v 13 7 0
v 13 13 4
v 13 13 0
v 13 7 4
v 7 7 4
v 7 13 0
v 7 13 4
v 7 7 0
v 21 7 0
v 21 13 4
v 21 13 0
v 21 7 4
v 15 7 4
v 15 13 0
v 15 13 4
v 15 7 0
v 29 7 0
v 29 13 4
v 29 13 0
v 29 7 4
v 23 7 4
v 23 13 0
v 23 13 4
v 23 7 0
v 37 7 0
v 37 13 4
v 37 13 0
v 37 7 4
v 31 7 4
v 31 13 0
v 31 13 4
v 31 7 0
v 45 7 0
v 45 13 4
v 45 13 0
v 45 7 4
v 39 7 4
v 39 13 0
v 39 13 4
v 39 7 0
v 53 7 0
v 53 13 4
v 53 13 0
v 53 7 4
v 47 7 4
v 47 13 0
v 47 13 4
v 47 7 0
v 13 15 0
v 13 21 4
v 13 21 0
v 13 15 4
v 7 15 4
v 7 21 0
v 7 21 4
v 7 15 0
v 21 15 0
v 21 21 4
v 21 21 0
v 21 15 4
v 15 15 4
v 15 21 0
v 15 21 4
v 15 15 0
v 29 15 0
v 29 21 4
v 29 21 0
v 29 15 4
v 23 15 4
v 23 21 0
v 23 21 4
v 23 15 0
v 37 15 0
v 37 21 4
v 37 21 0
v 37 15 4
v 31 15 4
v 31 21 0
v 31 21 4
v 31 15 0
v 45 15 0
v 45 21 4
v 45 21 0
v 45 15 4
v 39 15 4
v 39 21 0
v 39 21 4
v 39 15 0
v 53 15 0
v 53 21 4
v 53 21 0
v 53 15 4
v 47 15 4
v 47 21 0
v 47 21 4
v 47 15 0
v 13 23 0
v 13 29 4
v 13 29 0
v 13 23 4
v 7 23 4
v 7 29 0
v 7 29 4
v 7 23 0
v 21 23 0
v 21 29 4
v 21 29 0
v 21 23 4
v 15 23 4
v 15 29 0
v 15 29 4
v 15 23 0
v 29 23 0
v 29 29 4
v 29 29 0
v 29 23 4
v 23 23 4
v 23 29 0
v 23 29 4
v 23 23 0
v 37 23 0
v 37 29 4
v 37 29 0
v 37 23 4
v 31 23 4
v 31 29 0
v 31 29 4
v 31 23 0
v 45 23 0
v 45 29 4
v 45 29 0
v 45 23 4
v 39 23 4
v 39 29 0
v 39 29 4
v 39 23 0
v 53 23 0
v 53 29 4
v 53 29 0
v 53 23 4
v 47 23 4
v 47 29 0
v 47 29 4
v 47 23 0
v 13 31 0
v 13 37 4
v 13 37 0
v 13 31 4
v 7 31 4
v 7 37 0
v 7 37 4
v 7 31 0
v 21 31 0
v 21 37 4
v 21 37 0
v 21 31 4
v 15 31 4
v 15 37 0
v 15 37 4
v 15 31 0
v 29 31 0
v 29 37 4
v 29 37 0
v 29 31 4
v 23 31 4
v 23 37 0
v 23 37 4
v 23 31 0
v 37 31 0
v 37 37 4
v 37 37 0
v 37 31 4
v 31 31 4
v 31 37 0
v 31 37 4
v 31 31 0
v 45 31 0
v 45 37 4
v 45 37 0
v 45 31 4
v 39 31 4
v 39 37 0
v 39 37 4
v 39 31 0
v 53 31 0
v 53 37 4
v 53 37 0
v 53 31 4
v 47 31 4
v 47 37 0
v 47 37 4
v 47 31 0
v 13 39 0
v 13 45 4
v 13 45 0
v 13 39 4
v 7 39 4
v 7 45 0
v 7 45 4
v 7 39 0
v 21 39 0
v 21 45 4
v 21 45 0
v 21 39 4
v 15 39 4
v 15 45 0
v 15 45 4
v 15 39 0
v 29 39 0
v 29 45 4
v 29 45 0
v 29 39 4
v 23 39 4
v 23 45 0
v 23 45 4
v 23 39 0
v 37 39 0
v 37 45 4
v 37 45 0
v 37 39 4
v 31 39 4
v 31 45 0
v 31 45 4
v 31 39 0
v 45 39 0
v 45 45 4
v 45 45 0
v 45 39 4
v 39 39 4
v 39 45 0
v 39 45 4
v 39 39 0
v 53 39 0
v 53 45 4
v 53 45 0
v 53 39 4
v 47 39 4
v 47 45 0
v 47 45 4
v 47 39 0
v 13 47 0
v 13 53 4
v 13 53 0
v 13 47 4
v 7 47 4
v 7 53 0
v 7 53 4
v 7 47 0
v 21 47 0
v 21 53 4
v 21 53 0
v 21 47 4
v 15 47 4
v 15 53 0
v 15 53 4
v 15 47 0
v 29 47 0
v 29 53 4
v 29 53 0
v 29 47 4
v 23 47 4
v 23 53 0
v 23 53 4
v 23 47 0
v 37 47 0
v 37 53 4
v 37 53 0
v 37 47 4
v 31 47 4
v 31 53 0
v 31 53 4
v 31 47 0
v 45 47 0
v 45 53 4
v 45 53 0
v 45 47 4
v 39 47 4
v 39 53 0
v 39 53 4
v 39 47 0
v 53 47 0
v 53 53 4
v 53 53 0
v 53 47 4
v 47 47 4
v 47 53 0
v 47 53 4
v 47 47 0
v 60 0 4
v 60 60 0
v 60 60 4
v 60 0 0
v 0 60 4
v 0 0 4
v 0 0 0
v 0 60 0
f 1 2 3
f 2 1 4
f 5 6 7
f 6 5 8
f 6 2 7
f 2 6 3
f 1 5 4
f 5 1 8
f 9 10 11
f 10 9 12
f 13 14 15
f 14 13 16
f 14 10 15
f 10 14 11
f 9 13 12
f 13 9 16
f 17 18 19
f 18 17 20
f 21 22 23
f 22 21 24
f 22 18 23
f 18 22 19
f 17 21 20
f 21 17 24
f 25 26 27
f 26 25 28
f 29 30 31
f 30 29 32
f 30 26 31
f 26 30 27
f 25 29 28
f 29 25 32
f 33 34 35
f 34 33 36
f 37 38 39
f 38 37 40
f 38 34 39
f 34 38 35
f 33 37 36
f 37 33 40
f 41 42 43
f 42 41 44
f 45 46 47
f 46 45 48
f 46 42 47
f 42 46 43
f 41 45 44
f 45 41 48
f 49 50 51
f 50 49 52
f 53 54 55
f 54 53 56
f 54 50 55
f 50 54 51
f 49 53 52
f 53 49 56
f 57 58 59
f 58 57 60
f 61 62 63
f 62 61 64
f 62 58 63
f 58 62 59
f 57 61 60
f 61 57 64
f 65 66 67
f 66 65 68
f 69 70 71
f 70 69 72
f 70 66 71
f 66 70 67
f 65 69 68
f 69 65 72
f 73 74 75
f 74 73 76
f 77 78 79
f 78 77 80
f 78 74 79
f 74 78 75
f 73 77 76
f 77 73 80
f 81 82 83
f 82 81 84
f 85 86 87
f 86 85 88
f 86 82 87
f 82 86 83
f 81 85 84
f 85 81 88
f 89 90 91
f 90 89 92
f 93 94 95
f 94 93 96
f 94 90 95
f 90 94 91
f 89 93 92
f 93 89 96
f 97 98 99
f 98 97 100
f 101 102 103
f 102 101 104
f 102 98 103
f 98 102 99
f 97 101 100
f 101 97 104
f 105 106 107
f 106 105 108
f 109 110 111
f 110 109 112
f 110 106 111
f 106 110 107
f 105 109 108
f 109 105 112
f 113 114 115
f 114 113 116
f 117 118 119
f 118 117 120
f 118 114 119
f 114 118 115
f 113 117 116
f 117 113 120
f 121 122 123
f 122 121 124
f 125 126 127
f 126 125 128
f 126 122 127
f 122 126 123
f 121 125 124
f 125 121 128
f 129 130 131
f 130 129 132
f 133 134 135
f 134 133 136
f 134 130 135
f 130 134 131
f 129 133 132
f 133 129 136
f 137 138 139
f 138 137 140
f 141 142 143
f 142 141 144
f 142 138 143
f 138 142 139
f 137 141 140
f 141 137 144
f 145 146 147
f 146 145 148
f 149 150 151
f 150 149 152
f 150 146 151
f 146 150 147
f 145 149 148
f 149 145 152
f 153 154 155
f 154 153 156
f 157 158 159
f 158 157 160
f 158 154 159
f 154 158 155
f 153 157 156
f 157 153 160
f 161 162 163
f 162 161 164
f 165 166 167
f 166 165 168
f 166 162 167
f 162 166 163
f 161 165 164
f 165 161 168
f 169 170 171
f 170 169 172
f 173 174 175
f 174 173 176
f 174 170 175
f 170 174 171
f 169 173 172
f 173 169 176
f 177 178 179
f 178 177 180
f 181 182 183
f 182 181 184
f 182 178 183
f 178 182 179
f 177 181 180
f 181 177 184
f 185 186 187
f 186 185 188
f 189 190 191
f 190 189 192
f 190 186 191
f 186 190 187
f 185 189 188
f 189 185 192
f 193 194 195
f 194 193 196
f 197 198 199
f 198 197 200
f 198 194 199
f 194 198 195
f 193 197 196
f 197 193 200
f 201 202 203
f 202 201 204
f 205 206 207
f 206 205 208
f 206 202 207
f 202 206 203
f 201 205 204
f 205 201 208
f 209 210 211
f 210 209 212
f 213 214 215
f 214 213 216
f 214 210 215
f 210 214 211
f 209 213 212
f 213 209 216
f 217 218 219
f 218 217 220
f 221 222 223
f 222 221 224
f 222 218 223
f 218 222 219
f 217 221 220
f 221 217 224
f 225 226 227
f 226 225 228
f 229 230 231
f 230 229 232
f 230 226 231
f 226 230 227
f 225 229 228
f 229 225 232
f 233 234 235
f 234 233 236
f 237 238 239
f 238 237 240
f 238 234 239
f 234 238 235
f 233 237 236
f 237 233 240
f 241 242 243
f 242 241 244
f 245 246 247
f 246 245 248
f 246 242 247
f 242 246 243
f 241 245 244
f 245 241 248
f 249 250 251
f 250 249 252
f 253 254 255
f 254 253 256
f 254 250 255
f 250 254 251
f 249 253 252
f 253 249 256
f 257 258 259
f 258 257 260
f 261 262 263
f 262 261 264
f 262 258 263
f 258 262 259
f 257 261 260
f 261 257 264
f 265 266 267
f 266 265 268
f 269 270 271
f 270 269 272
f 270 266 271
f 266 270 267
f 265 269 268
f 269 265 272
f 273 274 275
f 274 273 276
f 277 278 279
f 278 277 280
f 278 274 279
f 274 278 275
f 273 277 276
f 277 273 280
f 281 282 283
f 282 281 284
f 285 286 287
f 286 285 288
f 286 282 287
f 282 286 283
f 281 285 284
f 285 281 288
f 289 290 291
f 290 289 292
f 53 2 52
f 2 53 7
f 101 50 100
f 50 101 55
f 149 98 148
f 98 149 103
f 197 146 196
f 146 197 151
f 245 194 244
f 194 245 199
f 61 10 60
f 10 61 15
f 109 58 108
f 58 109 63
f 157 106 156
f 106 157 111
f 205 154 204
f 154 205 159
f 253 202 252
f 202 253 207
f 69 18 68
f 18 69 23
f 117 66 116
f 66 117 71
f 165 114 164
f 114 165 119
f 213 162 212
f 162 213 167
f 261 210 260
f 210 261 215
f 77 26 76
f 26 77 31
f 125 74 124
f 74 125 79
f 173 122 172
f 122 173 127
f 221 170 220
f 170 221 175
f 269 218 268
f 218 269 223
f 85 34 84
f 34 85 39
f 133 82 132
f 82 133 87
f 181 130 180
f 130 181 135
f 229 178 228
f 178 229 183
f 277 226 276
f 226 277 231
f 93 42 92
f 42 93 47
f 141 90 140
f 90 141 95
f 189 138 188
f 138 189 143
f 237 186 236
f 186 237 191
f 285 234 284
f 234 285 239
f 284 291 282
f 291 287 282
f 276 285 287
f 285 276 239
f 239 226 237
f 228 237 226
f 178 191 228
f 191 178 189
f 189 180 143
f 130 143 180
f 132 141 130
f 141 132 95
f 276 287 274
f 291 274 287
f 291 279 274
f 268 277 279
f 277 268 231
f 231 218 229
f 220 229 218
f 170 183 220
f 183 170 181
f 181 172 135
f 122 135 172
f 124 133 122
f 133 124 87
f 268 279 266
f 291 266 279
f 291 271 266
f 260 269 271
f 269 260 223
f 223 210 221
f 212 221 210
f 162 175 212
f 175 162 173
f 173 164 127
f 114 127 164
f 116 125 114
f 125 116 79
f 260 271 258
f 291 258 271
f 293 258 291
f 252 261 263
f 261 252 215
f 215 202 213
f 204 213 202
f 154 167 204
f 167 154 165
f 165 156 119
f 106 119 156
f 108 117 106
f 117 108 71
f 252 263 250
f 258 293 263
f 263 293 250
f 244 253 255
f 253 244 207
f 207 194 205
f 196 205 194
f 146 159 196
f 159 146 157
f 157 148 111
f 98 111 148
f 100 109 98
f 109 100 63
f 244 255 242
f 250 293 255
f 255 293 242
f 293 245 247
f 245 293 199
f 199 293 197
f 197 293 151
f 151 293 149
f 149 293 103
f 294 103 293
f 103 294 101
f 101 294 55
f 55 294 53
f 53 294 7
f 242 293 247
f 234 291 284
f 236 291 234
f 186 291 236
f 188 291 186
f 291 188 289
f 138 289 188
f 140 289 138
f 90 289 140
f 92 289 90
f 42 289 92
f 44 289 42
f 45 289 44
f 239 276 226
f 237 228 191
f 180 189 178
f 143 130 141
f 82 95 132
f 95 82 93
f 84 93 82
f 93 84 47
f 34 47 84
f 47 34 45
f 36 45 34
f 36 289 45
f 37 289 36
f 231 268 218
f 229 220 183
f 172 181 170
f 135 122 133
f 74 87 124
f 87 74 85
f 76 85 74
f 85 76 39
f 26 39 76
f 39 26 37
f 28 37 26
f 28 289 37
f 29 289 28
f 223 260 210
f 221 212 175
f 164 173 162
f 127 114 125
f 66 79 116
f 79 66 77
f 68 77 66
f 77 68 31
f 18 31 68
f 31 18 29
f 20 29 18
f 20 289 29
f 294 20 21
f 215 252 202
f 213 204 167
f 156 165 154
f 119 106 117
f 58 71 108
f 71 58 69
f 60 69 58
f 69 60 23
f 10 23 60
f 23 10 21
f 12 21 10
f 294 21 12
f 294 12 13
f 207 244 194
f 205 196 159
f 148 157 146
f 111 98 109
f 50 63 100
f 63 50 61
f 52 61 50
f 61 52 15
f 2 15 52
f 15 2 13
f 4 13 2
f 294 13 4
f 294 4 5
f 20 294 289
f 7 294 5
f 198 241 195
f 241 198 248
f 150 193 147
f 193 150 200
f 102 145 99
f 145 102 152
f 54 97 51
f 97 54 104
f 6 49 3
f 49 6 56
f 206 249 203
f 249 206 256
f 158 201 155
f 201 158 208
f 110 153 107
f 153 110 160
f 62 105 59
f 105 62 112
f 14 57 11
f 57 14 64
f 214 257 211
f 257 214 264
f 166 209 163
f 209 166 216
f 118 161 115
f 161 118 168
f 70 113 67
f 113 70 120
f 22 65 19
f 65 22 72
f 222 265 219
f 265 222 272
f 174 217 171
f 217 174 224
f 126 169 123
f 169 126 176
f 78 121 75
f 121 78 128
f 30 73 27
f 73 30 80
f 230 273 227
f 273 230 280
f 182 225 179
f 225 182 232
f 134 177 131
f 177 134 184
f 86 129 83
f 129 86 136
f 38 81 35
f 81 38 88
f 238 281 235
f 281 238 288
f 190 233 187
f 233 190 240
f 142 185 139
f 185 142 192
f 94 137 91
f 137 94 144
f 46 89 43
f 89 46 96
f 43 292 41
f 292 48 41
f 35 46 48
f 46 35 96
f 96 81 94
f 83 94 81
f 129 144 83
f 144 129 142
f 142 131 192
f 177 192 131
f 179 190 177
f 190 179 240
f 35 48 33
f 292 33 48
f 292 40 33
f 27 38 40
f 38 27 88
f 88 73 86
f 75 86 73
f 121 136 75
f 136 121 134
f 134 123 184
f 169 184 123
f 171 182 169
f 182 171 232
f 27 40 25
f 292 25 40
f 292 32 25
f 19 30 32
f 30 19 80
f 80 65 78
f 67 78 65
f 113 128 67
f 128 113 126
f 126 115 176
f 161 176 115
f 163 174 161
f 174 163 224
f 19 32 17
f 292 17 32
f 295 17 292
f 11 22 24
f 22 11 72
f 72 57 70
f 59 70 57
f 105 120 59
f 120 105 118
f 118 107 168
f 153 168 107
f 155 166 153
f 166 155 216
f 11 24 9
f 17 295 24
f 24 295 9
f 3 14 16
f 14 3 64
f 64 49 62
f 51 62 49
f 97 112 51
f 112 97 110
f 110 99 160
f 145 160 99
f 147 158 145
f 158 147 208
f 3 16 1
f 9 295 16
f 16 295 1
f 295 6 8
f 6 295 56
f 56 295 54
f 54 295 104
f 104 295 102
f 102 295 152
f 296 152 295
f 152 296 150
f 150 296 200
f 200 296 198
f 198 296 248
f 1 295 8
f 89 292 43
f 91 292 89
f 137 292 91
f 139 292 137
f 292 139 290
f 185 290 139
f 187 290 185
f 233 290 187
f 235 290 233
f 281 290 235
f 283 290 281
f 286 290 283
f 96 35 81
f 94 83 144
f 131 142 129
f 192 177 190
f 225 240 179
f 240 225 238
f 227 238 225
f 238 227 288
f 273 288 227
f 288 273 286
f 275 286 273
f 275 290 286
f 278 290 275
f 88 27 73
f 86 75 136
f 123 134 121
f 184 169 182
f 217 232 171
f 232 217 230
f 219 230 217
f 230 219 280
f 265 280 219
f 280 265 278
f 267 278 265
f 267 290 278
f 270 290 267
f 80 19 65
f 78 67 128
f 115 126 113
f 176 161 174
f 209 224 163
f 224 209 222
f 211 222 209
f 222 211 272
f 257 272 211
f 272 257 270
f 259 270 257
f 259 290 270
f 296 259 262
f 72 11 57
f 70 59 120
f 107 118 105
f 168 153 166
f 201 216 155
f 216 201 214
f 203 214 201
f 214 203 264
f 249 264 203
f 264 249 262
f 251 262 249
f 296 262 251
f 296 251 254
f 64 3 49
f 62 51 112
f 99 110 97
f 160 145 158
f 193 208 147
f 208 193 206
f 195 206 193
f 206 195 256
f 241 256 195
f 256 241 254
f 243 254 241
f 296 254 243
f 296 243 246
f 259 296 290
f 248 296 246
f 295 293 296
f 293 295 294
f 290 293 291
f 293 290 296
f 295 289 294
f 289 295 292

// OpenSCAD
w = 60;
h = 60;
d = 4;

hw=6;
hw_gap=2;
count=w / (hw + hw_gap);

difference(){
cube([w, h, d]);
 
for(i = [1:count-1]){
for(a = [1:count-1])
    color("red")
    translate([a*(hw+hw_gap)-1,i*(hw + hw_gap)-1, -1])
    cube([hw,hw,d+2]);
}
   }
